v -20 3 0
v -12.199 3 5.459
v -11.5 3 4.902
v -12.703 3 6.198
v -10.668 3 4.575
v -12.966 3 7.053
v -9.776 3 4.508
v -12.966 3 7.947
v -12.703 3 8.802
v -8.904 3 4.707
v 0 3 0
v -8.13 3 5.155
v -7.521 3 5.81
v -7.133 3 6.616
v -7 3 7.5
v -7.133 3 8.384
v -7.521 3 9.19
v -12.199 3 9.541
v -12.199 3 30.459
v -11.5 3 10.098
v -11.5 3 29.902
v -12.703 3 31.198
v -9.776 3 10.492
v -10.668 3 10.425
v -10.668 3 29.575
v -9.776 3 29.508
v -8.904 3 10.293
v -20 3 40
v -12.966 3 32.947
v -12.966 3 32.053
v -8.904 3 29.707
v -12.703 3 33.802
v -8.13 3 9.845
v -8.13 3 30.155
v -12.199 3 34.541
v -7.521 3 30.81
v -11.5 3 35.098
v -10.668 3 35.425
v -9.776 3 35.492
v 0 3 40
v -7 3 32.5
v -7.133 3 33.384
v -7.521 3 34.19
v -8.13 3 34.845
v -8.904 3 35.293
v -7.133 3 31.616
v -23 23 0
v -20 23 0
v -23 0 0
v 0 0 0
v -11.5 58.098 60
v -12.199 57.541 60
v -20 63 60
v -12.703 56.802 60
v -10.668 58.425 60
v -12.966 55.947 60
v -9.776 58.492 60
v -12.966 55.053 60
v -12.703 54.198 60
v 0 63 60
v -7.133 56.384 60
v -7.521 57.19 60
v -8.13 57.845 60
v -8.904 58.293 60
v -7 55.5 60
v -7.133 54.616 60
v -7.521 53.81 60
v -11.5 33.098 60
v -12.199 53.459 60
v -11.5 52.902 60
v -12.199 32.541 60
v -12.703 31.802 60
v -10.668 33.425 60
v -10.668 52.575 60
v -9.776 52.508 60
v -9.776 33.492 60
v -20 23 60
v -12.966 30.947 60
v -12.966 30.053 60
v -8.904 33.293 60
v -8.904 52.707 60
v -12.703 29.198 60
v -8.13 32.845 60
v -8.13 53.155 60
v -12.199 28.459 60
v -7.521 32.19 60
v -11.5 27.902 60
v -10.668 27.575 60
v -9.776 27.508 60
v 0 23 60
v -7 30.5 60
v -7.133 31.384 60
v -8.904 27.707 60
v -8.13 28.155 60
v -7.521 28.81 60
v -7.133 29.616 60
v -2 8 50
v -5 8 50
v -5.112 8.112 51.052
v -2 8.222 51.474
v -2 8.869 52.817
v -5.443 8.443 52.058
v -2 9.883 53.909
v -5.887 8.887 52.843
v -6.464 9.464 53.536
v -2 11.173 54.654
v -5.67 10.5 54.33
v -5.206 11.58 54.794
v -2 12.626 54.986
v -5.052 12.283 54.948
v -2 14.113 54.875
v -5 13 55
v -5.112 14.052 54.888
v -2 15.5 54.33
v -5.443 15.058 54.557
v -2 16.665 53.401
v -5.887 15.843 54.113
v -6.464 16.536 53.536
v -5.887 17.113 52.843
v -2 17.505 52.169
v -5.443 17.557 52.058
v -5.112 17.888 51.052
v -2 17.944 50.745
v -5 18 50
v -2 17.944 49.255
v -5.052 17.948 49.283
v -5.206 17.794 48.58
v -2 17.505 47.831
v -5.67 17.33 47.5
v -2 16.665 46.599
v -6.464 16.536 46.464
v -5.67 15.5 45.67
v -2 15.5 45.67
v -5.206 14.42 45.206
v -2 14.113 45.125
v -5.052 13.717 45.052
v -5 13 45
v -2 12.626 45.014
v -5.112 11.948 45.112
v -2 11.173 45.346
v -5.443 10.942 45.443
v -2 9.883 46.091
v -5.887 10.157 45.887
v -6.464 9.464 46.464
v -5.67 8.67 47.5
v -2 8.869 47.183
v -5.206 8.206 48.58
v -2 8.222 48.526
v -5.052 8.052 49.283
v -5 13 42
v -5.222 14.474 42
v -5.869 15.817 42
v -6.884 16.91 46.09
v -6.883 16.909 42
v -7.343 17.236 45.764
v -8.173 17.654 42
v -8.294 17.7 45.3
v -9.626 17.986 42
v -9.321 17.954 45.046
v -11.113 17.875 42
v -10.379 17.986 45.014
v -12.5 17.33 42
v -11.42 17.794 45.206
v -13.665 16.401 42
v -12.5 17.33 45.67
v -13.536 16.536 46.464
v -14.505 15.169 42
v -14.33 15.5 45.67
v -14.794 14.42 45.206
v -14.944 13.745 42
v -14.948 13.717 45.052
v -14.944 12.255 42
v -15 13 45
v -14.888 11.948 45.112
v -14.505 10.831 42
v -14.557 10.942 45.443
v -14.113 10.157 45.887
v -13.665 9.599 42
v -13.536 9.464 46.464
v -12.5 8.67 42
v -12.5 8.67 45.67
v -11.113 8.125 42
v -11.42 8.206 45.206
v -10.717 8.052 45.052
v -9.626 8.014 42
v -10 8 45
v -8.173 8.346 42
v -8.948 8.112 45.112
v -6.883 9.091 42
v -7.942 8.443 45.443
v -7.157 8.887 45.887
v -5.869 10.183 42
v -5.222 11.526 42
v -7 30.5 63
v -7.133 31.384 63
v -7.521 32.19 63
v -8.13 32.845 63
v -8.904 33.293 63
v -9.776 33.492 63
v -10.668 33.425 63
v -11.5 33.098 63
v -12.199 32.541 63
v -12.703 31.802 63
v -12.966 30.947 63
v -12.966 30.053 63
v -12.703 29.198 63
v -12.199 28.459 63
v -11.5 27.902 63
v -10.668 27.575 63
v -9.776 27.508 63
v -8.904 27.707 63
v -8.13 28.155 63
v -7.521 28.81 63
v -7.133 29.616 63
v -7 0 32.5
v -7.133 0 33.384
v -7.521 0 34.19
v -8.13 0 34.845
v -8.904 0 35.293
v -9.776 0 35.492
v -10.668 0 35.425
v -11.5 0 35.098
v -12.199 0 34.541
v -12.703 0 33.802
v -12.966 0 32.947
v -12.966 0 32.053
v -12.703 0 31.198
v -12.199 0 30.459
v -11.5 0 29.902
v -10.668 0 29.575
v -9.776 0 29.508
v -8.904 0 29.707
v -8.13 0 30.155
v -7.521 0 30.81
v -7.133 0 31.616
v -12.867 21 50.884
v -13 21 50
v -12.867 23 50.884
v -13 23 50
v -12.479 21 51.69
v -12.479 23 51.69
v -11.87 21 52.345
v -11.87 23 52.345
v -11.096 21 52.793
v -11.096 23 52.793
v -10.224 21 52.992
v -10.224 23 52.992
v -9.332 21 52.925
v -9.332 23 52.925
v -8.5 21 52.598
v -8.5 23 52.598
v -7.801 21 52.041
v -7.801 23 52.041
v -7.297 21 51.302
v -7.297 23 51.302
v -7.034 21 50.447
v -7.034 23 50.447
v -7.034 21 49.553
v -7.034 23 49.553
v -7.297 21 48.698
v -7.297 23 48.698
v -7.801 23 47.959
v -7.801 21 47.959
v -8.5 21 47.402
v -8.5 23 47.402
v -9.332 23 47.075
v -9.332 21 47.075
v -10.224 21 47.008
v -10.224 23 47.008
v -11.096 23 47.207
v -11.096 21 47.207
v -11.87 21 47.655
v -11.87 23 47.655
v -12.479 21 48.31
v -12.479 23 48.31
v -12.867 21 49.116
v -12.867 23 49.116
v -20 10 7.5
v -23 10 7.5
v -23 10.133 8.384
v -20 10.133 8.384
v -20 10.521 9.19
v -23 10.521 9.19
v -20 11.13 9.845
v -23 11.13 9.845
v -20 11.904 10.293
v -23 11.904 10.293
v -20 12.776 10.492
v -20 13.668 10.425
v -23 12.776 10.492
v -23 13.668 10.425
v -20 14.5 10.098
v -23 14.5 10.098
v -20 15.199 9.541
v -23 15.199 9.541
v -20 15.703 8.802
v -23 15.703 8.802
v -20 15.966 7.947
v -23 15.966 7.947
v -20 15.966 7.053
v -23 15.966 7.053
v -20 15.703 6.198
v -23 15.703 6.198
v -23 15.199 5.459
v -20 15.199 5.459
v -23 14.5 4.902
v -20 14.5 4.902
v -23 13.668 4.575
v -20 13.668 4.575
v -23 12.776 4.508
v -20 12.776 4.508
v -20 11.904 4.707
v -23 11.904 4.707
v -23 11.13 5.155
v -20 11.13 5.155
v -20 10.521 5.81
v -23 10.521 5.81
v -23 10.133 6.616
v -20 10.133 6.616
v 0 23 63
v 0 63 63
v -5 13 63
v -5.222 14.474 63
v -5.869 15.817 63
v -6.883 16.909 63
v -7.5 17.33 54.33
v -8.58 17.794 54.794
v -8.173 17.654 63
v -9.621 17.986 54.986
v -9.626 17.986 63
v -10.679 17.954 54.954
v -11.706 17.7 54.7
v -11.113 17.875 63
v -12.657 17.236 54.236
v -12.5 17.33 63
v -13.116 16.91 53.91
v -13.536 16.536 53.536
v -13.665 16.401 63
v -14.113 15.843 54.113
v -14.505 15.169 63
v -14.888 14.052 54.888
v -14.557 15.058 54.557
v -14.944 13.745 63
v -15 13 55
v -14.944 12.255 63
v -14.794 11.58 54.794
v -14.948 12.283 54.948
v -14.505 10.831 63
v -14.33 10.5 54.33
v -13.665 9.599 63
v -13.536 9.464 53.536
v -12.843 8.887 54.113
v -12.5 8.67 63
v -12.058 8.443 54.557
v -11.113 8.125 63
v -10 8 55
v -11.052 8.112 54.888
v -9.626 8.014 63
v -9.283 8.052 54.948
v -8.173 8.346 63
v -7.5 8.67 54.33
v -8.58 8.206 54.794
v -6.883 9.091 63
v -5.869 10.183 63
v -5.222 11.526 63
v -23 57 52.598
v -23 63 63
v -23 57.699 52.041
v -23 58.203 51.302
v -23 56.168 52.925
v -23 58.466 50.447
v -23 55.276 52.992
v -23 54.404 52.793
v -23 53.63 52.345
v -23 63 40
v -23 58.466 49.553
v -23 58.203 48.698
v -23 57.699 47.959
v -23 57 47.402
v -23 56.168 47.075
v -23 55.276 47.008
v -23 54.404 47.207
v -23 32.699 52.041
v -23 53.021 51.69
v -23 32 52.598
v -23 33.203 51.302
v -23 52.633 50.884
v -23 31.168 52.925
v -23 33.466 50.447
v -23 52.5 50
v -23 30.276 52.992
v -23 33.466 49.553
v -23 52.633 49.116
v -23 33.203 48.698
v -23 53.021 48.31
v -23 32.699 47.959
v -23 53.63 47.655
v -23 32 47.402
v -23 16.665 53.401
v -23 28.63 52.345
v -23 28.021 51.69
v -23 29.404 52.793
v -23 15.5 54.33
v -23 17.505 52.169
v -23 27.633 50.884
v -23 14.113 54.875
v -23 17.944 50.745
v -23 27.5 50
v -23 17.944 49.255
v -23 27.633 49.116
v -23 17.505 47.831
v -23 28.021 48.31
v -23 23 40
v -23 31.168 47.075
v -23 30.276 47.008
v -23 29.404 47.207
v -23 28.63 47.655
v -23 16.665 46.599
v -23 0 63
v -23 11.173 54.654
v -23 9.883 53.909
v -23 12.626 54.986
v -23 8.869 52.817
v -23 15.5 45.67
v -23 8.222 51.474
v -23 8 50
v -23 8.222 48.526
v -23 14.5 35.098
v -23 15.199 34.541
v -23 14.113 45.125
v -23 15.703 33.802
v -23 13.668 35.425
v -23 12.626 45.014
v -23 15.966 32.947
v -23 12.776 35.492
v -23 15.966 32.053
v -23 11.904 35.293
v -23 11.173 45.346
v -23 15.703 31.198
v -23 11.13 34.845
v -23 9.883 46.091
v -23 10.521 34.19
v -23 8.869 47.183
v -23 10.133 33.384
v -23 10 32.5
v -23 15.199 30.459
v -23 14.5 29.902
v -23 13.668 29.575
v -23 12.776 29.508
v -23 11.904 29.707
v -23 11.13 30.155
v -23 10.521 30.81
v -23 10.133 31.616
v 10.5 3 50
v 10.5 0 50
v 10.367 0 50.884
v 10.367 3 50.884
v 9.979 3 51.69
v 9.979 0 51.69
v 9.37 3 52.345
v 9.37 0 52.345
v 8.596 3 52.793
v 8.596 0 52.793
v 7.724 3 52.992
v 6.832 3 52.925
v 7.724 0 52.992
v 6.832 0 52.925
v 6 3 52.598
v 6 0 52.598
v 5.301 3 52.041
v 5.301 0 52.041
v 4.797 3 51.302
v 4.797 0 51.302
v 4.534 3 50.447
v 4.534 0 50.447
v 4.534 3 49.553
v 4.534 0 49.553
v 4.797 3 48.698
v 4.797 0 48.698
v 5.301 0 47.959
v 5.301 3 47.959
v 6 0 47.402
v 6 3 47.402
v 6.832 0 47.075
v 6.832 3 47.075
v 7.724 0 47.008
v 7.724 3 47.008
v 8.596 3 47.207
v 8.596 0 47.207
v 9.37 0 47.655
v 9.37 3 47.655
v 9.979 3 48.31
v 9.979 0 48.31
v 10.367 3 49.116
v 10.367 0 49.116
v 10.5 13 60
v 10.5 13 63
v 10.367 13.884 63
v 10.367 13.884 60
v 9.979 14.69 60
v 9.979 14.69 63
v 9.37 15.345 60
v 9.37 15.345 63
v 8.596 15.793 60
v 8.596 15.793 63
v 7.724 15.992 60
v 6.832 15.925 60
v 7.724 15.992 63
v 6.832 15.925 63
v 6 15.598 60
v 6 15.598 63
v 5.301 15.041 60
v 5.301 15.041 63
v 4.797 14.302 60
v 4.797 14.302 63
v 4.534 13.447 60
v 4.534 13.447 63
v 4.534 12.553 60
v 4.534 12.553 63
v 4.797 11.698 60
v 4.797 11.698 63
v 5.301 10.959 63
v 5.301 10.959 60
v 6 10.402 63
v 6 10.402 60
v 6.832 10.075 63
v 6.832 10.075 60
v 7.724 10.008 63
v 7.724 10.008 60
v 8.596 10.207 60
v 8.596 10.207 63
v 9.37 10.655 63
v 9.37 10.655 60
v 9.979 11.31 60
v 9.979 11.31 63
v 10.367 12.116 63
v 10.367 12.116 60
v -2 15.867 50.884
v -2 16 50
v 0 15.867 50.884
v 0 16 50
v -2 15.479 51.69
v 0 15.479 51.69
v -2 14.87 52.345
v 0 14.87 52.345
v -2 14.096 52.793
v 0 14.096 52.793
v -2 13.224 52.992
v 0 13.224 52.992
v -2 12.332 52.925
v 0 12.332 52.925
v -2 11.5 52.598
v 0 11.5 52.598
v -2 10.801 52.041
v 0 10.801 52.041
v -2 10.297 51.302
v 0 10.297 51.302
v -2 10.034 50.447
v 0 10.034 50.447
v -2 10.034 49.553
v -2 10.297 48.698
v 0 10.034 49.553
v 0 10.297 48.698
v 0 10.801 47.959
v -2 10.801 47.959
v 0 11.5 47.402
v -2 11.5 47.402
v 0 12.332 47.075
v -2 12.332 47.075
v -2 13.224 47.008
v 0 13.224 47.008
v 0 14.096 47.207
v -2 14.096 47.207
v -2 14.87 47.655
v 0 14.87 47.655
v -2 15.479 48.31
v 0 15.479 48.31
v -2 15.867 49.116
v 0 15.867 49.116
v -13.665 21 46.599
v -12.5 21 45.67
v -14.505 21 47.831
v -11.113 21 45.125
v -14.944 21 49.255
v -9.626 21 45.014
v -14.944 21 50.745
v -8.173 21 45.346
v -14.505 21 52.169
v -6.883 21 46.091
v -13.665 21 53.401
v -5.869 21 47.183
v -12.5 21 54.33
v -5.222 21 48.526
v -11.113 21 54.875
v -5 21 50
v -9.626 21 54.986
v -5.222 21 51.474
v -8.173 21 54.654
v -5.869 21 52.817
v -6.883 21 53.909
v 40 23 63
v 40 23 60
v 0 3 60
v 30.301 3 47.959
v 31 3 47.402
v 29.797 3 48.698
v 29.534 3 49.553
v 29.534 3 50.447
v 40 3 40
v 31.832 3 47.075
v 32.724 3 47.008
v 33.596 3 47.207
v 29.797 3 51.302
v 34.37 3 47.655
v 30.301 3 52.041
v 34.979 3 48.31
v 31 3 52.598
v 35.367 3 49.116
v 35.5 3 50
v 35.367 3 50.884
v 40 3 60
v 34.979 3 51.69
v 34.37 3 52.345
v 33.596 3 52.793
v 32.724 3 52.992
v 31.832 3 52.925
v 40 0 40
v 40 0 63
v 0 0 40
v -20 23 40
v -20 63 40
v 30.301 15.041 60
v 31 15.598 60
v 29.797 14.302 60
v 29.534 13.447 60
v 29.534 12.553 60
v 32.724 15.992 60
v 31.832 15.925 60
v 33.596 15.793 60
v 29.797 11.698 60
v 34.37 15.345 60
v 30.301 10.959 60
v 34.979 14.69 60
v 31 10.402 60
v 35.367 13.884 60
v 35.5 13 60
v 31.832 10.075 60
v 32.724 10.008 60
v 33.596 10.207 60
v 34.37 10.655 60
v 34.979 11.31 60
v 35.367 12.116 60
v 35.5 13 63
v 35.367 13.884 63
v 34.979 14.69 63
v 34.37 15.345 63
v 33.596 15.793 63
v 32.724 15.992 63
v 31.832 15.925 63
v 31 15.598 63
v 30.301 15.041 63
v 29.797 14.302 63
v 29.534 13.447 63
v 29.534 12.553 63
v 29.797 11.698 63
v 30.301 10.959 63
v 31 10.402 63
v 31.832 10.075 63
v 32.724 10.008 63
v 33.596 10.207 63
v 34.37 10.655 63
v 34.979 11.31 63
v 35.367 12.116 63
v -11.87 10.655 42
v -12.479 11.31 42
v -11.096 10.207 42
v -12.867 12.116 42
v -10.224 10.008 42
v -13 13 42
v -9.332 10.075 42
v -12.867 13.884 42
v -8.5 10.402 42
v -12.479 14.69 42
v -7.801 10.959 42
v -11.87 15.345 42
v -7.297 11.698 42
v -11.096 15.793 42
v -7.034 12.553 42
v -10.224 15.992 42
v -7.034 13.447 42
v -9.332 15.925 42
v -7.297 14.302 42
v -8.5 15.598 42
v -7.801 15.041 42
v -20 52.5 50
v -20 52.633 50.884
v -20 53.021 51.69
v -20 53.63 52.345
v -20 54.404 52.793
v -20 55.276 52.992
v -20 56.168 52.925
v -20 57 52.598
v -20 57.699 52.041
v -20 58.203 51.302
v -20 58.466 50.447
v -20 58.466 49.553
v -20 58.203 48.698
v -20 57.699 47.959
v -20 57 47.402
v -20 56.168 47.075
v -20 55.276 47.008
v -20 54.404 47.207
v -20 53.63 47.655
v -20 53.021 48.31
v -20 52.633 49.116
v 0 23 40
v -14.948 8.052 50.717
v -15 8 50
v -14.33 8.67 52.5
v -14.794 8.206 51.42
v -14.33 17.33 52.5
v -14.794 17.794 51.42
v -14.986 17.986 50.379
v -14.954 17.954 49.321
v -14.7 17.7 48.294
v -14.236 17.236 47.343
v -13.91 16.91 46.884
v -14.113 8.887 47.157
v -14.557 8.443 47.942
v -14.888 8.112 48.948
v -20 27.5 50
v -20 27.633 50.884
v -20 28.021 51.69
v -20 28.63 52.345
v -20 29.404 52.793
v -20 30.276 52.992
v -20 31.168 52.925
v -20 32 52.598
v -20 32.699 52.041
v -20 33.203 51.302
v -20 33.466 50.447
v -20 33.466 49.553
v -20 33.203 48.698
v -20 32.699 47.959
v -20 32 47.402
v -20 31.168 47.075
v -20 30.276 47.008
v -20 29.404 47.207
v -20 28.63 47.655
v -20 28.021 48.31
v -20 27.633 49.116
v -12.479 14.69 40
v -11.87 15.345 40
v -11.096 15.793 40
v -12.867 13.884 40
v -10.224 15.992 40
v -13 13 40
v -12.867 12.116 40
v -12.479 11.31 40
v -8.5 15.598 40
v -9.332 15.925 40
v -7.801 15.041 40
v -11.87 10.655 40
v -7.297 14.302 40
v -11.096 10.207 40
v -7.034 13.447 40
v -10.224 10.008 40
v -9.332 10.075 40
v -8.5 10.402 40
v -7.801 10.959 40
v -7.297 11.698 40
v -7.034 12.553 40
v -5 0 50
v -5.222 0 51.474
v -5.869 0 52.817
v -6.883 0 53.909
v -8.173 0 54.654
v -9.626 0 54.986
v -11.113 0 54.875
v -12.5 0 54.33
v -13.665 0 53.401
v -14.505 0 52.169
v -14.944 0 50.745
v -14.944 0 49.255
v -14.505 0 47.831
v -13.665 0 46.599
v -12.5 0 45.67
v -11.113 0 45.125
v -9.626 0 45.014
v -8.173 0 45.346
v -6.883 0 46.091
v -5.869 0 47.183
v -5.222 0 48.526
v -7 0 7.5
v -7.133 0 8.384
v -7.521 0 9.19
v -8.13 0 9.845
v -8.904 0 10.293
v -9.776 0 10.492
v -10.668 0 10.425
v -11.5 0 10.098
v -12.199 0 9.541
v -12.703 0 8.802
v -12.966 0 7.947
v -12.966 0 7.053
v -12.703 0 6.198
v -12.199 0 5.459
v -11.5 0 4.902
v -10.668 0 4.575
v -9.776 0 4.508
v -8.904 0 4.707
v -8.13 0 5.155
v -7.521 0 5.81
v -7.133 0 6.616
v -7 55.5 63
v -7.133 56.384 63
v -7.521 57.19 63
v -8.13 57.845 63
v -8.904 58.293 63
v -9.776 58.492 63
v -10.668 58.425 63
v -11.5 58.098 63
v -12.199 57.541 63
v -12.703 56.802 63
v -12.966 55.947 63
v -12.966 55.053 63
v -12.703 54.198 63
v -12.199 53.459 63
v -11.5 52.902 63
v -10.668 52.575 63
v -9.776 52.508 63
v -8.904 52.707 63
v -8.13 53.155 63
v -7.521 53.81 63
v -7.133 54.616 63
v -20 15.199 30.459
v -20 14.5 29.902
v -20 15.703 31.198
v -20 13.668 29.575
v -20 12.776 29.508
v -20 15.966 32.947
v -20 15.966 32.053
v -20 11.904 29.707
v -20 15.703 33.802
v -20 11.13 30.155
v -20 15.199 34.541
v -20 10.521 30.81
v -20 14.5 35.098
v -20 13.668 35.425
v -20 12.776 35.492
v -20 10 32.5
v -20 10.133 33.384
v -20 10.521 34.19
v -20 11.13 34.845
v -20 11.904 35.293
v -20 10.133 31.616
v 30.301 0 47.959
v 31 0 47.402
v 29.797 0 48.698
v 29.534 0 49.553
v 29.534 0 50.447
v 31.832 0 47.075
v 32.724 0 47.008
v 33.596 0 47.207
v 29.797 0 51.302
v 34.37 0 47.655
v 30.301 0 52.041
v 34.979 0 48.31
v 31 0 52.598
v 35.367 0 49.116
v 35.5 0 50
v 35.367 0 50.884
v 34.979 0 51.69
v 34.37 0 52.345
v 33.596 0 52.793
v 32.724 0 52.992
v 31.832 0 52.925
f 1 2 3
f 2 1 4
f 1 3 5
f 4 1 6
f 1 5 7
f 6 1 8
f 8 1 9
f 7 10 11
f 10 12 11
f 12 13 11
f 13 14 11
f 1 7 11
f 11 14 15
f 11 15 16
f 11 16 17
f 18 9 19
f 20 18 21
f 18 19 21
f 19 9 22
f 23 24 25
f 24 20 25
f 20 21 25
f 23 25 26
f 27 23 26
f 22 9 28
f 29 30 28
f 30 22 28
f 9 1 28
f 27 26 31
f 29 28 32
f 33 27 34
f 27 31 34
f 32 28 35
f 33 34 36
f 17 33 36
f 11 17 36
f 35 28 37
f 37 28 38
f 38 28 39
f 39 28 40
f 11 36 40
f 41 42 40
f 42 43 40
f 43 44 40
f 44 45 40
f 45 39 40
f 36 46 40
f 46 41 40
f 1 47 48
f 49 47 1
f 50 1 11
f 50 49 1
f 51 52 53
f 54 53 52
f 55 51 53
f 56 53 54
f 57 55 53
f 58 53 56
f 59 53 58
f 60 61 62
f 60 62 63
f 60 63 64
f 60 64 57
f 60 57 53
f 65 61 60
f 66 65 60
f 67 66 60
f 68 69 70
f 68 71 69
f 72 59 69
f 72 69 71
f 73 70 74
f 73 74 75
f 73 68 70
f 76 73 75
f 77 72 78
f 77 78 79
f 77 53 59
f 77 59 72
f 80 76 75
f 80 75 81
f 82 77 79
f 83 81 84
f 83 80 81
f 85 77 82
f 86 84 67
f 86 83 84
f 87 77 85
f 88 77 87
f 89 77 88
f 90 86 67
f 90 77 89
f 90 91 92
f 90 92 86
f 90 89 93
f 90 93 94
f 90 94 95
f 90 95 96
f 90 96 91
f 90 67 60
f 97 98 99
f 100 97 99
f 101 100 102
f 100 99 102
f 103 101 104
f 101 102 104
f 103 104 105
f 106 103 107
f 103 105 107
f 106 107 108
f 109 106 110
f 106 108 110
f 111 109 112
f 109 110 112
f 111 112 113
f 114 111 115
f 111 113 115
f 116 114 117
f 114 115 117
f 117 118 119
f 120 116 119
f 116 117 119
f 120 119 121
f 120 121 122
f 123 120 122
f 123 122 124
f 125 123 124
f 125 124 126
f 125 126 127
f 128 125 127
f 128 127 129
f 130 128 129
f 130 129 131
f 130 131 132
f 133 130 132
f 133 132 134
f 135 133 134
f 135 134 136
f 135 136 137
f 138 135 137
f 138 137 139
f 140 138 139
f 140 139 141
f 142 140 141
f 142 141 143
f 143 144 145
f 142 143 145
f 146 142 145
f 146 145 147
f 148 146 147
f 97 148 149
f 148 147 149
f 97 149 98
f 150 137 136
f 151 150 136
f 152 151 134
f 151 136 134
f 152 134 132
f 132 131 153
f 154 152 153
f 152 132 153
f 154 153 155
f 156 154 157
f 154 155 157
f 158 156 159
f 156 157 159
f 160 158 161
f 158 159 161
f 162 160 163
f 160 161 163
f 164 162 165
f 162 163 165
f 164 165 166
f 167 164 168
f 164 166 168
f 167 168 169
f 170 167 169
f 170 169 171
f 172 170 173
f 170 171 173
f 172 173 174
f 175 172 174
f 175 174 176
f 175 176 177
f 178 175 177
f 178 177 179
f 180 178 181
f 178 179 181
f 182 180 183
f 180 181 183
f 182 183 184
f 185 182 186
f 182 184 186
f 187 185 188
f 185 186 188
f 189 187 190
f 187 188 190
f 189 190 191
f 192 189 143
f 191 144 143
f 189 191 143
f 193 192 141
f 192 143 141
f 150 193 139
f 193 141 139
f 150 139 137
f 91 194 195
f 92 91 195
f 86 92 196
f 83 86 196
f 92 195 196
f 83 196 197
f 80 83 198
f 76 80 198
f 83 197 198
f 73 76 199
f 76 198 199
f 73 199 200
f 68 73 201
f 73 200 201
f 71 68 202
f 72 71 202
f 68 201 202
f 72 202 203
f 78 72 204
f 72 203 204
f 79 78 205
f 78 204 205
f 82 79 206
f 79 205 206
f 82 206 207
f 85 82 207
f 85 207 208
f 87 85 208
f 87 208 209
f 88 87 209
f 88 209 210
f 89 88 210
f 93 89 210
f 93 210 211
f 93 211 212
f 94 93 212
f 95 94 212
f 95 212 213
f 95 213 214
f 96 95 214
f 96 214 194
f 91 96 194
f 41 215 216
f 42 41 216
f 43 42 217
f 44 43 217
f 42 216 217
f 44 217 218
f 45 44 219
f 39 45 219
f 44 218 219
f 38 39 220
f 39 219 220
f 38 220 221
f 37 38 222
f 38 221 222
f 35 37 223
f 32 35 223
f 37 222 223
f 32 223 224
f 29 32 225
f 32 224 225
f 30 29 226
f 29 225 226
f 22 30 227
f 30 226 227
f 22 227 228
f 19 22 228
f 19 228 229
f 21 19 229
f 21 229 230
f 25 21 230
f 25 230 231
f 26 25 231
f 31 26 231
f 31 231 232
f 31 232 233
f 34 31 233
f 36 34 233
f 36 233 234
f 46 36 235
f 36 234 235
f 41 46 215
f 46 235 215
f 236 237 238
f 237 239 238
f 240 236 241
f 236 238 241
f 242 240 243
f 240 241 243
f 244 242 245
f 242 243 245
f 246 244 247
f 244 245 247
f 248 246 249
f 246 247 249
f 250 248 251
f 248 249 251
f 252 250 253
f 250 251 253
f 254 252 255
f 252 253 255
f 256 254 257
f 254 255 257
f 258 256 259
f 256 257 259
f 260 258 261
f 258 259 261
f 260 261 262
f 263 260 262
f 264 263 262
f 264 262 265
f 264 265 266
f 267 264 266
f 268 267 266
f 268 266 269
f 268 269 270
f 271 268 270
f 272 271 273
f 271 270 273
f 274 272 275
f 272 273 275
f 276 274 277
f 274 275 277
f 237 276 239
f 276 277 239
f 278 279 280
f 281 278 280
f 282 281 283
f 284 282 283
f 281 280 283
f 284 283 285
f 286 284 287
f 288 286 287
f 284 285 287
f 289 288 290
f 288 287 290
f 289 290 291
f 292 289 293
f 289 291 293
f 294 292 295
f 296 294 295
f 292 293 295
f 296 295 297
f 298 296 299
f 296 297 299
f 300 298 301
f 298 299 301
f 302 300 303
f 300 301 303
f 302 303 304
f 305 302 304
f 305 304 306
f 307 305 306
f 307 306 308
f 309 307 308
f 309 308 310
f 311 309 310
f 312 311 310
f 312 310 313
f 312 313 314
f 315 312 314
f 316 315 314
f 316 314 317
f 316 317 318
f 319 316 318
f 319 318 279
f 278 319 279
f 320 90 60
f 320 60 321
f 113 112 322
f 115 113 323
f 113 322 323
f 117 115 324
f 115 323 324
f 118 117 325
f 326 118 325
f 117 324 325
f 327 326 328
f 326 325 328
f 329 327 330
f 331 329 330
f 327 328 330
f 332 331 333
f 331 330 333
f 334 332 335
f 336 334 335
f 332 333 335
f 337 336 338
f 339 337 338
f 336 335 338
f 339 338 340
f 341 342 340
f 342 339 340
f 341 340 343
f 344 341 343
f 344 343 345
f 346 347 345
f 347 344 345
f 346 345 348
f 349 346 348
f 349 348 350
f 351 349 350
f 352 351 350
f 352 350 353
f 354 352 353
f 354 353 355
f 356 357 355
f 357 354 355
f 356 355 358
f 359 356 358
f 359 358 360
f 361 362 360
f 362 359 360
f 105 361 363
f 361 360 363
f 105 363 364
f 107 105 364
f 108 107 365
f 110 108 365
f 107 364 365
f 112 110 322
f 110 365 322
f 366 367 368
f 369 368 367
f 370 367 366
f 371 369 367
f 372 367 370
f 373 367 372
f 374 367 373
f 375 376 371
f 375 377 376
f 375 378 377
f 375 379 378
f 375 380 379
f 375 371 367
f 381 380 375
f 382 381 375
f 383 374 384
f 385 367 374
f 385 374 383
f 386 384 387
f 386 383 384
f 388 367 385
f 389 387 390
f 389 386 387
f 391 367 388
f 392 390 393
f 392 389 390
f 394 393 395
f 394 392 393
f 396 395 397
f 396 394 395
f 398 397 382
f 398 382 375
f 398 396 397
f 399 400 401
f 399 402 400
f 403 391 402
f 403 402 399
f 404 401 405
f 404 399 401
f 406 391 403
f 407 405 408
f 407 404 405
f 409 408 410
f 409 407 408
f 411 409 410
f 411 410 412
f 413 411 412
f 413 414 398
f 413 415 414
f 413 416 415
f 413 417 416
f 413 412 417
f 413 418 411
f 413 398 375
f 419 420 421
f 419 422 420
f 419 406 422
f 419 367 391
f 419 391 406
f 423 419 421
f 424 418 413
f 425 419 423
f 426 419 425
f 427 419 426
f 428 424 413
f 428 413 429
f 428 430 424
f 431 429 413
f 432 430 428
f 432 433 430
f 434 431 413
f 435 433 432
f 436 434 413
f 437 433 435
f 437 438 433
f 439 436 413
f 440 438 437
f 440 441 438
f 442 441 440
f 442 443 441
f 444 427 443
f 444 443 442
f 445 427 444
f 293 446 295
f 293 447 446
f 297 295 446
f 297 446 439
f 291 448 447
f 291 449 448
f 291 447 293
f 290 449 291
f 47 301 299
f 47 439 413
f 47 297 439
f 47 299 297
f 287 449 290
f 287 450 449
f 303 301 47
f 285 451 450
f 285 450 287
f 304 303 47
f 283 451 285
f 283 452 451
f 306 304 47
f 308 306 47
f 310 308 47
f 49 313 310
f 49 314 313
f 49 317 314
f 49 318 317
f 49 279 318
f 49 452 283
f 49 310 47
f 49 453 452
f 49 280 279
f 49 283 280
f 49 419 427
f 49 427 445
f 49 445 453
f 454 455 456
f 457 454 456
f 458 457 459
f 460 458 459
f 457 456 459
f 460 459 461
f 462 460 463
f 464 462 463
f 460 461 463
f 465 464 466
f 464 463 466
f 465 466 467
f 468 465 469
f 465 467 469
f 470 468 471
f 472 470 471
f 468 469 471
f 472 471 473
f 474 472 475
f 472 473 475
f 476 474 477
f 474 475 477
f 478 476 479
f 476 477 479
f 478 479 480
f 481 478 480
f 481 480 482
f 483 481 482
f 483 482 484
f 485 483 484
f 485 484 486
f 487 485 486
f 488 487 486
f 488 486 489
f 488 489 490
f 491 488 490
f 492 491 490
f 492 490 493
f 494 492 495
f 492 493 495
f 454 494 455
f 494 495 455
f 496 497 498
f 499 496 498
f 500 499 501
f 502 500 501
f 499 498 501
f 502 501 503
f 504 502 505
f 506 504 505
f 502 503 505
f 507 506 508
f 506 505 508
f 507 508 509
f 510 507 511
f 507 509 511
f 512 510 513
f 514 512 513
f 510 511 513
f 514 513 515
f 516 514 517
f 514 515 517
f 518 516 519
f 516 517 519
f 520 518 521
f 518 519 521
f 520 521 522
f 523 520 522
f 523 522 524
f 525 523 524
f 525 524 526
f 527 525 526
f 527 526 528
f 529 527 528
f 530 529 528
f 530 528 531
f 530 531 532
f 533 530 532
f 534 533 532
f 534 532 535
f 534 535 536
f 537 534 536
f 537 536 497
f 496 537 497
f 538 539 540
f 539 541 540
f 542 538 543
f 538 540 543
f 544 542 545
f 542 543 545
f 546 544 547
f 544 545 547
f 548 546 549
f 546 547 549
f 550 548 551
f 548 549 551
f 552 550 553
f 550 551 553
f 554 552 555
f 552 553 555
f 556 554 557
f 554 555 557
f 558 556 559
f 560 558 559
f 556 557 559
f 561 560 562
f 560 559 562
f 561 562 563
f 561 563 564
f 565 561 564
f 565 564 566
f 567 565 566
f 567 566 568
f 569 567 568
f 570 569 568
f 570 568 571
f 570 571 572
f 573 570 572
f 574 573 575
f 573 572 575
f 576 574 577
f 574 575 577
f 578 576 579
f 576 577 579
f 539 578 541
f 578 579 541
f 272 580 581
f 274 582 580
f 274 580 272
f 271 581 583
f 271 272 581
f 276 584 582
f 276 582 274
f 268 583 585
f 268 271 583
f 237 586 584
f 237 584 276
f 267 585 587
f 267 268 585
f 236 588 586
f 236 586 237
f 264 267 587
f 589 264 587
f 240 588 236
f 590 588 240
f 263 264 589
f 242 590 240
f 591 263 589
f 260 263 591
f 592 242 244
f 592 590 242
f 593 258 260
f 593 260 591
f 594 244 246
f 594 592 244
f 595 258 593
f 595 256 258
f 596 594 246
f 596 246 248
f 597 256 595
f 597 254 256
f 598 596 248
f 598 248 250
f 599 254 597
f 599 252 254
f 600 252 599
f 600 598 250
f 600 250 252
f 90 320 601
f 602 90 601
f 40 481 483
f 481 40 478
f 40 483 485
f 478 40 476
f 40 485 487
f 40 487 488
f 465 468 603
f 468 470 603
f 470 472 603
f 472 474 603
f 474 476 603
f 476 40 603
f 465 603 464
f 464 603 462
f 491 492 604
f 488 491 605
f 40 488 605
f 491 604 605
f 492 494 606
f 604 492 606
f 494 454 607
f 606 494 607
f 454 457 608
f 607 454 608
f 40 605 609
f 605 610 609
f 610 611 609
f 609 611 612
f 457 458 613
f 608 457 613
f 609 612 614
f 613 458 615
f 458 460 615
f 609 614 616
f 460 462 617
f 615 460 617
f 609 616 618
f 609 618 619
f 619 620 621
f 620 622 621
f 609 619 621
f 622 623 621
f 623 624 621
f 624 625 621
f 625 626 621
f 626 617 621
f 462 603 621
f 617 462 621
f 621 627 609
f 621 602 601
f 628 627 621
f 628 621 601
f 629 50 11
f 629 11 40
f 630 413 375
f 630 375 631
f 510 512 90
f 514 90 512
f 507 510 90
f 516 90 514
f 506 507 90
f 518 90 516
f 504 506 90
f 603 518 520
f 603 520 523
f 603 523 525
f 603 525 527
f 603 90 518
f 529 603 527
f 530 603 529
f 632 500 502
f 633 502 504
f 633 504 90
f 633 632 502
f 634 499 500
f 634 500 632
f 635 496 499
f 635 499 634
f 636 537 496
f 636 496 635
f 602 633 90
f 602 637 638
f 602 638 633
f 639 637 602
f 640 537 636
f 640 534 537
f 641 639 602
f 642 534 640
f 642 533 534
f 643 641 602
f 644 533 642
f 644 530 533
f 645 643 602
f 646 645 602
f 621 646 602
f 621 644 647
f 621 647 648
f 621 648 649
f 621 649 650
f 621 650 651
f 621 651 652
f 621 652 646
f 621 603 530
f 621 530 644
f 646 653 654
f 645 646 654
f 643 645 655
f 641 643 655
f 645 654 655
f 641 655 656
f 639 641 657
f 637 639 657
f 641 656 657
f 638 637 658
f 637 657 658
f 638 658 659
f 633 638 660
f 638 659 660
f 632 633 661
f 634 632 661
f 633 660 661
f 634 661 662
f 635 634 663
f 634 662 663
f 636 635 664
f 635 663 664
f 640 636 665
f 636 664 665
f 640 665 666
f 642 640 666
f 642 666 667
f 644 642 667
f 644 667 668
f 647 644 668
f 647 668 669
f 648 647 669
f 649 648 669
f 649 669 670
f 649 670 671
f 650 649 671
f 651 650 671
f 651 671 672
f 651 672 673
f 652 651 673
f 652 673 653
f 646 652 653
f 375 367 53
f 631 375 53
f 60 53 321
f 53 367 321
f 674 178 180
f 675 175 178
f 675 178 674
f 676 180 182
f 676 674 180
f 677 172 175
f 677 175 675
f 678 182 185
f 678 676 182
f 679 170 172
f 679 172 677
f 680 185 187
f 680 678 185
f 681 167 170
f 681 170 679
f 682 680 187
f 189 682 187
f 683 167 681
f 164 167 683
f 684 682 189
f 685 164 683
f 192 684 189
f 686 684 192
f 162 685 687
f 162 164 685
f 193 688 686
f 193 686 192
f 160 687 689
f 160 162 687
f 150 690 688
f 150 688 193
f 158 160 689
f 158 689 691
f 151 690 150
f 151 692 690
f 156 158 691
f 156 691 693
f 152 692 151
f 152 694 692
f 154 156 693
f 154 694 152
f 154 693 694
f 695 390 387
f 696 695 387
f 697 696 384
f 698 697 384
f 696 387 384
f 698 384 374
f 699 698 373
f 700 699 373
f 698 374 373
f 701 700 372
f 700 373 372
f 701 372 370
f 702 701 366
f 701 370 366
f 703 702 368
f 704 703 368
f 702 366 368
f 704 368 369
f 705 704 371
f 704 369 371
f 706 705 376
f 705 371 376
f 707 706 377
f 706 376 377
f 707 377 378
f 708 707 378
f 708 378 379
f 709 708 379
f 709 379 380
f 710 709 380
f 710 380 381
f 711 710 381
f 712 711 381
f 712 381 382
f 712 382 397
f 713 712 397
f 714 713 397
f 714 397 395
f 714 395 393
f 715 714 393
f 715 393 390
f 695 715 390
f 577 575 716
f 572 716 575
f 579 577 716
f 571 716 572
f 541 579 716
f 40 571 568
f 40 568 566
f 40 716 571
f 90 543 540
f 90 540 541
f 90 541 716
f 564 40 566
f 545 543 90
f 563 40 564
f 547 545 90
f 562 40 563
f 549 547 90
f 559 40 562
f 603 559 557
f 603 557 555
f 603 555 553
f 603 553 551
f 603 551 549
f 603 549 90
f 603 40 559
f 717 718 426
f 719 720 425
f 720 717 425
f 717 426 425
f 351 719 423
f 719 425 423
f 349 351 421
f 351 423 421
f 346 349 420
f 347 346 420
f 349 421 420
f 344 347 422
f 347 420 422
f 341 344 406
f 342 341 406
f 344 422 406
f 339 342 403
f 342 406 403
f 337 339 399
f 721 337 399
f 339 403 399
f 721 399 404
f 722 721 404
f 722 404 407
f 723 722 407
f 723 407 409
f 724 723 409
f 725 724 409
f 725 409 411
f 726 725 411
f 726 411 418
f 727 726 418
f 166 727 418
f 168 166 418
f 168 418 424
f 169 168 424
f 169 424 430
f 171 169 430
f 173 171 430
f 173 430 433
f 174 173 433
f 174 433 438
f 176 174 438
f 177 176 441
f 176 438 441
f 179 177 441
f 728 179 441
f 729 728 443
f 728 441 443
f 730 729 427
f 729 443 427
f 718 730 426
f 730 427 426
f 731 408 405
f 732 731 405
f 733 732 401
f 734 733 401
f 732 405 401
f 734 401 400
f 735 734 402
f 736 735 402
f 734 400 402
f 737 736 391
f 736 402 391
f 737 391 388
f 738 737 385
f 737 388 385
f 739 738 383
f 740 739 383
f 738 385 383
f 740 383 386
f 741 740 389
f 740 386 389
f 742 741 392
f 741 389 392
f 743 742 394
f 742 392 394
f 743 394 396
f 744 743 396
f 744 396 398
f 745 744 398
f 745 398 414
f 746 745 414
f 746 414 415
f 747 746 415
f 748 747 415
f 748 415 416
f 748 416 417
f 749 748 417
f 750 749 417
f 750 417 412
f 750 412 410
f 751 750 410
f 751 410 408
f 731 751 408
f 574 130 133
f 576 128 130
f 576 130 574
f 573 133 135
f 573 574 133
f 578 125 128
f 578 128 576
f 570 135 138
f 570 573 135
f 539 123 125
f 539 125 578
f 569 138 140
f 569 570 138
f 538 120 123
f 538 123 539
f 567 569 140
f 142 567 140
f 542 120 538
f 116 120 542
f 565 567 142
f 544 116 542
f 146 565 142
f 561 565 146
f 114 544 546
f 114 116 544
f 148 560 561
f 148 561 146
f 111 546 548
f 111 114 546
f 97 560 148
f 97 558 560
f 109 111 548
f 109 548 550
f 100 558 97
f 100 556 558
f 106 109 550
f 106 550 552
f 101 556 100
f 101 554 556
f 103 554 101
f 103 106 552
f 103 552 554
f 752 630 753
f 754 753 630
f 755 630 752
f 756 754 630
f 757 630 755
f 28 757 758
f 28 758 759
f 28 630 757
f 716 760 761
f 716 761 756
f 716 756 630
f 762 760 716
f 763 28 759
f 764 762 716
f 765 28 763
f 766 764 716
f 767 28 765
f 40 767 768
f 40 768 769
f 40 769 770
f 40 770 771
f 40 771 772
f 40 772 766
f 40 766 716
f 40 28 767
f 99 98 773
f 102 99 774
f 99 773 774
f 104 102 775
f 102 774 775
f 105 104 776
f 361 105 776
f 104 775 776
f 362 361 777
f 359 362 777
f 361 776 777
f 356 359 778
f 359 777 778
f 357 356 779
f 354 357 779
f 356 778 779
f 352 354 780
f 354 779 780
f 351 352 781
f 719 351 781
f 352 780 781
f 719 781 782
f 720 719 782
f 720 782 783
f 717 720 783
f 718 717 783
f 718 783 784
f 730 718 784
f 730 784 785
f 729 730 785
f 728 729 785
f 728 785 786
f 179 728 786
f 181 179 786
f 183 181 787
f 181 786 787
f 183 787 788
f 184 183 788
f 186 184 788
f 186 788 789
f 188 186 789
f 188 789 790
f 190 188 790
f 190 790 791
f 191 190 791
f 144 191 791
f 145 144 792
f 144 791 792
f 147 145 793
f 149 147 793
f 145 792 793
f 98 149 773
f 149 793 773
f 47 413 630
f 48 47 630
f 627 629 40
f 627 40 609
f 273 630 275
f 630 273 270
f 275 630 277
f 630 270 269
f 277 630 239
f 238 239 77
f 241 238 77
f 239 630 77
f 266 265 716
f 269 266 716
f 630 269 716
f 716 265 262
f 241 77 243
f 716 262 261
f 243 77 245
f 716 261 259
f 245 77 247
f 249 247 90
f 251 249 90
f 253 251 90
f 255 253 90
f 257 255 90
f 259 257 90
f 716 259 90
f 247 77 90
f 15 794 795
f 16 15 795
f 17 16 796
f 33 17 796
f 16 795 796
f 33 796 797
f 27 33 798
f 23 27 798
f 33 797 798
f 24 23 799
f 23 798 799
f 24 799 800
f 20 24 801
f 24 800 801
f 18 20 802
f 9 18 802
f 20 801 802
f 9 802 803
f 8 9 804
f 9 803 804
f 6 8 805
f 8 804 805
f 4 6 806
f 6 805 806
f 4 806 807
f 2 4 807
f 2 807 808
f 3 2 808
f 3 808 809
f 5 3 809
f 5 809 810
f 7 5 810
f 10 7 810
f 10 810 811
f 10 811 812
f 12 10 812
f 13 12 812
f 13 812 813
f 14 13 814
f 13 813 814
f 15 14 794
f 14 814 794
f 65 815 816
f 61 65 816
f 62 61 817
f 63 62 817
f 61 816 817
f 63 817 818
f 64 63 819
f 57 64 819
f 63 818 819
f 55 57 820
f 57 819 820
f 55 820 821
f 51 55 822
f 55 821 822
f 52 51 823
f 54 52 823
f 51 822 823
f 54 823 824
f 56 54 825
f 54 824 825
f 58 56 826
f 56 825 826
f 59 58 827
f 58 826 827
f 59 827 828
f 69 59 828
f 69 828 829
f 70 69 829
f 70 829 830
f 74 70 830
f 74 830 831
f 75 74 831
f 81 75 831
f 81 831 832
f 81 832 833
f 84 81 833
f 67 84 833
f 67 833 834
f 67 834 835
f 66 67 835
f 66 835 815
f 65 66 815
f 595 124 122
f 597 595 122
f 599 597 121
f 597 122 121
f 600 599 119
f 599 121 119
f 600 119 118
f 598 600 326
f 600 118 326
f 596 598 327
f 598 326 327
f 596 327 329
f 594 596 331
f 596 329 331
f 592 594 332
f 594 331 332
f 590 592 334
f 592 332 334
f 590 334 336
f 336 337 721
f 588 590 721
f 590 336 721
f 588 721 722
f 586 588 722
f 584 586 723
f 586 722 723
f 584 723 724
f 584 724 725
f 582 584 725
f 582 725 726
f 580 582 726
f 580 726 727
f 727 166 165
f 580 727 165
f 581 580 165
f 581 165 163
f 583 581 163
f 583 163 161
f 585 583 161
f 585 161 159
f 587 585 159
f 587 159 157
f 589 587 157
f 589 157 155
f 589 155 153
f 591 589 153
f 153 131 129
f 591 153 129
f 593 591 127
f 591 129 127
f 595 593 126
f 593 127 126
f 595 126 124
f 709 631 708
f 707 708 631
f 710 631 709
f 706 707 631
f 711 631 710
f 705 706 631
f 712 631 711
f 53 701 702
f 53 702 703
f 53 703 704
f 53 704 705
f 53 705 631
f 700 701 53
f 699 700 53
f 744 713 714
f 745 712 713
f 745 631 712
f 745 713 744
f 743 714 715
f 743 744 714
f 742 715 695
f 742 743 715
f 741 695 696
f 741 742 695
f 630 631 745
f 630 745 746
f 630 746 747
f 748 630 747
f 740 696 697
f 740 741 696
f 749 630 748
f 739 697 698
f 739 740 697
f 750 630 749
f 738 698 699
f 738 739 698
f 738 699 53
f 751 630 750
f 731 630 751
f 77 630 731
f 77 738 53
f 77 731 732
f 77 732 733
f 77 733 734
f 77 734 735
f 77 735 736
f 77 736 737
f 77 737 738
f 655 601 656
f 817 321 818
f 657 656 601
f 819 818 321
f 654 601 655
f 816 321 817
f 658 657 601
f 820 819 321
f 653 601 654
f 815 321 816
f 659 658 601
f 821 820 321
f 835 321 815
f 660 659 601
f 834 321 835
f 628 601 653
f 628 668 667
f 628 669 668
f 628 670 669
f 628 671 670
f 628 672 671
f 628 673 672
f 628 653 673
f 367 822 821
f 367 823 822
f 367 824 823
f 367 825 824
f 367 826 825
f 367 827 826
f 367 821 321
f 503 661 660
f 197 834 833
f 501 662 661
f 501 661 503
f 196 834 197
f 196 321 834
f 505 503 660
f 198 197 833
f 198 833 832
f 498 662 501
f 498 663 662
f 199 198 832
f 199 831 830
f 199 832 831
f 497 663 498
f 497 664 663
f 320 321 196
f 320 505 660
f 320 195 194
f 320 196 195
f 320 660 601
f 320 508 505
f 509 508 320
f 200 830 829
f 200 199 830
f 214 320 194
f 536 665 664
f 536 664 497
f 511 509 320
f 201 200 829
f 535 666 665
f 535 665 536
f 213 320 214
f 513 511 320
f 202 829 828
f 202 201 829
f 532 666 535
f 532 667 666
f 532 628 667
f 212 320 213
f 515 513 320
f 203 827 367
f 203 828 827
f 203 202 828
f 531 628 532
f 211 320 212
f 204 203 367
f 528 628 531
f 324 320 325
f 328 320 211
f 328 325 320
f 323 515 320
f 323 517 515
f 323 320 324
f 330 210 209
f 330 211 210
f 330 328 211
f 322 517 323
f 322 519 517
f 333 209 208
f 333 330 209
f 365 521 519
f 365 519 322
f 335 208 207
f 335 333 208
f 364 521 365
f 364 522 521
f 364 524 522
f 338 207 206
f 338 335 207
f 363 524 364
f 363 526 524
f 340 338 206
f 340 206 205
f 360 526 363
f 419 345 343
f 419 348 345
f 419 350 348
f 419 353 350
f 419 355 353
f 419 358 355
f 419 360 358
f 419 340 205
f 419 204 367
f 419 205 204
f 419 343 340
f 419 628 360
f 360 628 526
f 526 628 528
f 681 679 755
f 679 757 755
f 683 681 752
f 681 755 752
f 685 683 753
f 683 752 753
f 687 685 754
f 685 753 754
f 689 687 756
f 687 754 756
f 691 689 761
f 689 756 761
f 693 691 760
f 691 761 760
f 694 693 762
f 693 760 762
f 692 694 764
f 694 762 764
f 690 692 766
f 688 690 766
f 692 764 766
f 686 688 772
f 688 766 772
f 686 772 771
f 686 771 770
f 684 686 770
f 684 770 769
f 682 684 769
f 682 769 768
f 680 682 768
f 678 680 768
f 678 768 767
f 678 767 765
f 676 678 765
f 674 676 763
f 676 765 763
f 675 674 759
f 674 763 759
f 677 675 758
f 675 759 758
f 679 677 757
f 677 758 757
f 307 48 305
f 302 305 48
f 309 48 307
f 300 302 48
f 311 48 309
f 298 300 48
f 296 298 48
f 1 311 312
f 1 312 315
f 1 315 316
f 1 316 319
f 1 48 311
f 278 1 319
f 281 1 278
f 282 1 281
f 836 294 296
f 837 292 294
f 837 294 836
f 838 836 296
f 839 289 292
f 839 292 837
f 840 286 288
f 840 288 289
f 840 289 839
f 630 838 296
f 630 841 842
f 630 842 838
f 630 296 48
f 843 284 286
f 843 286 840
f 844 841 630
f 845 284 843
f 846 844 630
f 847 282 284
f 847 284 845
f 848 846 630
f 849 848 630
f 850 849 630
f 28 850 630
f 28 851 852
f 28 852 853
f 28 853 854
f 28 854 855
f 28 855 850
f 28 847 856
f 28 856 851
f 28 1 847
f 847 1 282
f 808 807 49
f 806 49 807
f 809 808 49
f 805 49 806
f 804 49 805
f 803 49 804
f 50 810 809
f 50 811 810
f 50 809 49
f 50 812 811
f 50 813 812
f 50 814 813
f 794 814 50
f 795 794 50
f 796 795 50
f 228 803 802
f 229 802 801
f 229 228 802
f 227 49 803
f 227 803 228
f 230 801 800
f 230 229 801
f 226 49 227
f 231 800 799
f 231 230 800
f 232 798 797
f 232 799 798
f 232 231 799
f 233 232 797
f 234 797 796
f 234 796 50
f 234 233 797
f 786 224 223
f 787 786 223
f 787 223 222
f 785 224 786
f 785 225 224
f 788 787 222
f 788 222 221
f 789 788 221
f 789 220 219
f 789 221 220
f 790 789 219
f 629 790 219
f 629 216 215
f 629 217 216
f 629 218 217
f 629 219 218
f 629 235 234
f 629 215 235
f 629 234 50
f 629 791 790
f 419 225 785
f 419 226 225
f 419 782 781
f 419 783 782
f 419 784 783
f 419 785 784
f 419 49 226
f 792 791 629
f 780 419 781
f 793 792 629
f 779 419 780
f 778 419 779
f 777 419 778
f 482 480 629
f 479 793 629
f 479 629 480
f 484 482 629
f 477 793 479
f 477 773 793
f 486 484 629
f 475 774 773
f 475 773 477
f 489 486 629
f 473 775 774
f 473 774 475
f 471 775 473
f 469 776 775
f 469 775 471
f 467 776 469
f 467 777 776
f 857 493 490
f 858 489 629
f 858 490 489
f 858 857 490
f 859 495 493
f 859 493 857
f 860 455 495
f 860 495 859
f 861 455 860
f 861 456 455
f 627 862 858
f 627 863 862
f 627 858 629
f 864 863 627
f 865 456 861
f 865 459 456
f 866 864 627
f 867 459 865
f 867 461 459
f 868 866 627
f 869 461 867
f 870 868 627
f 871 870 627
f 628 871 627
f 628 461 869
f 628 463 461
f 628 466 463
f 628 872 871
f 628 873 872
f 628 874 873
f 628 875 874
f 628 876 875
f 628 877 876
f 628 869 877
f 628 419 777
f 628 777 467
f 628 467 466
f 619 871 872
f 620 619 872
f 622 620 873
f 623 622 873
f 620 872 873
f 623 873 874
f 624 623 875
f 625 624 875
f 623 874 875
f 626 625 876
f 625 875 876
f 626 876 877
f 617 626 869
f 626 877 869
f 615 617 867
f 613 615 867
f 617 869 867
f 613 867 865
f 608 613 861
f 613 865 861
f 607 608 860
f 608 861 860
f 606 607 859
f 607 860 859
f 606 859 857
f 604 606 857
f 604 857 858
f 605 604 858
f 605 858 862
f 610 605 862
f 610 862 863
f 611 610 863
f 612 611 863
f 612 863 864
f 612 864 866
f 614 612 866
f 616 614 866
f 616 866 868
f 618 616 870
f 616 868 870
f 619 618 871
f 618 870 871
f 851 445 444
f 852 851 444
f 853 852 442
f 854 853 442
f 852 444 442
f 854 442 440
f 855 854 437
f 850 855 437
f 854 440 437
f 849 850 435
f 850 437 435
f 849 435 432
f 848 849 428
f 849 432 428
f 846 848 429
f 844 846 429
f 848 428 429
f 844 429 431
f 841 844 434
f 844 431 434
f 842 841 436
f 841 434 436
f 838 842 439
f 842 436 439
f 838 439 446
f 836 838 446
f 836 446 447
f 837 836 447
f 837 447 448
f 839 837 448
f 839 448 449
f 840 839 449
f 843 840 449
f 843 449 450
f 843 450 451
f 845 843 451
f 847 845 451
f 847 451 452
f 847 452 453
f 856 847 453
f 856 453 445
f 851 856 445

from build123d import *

# Parameters (mm, degrees)
F0_W                 = 20
F0_H                 = 40
F0_R                 = 3
F0_H_2               = 20
F0_R_2               = 5
F0_W_2               = 40
F1_DEPTH             = 3
F0_W_3               = 3
F0_H_3               = 3
F2_DEPTH             = 23
F3_DEPTH             = 63
F4_R                 = 3
F4_R_2               = 5
F6_DEPTH             = 25
F5_R                 = 3
F5_R_2               = 5
F7_DEPTH             = 25
F8_DEPTH             = 23
F9_D                 = 6
F9_DEPTH             = 23
F9_CBORE_D           = 10
F9_CBORE_DEPTH       = 21
F9_TIP               = 1.8025818571
F9_ON_F5_D           = 6
F9_ON_F5_DEPTH       = 23
F9_ON_F5_CBORE_D     = 10
F9_ON_F5_CBORE_DEPTH = 21
F9_ON_F5_TIP         = 1.8025818571
F9_ON_F4_D           = 6
F9_ON_F4_DEPTH       = 23
F9_ON_F4_CBORE_D     = 10
F9_ON_F4_CBORE_DEPTH = 21
F9_ON_F4_TIP         = 1.8025818571


# Not quite as in the source:
# - a feature of the source that left no trace in its solid (it failed there, or was rolled back) is left out


with BuildPart() as f1:
    # F0 (on Front) → F1 (new body)
    with BuildSketch(Plane.XZ):
        with Locations((-10, 20)):
            Rectangle(F0_W, F0_H)
        with Locations((-10, 7.5)):
            Circle(F0_R, mode=Mode.SUBTRACT)
        with Locations((-10, 32.5)):
            Circle(F0_R, mode=Mode.SUBTRACT)
        with Locations((-10, 50)):
            Rectangle(F0_W, F0_H_2)
        with Locations((-10, 50)):
            Circle(F0_R_2, mode=Mode.SUBTRACT)
        with Locations((20, 50)):
            Rectangle(F0_W_2, F0_H_2)
        with Locations((7.5, 50)):
            Circle(F0_R, mode=Mode.SUBTRACT)
        with Locations((32.5, 50)):
            Circle(F0_R, mode=Mode.SUBTRACT)
    extrude(amount=-F1_DEPTH)

    # F0 (on Front) → F2 (join)
    with BuildSketch(Plane.XZ):
        with Locations((-21.5, 20)):
            Rectangle(F0_W_3, F0_H)
        with Locations((20, 61.5)):
            Rectangle(F0_W_2, F0_H_3)
    extrude(amount=-F2_DEPTH)

    # F0 (on Front) → F3 (join)
    with BuildSketch(Plane.XZ):
        Polygon((-20, 60), (0, 60), (0, 63), (-23, 63), (-23, 60), align=None)
        with Locations((-21.5, 50)):
            Rectangle(F0_W_3, F0_H_2)
    extrude(amount=-F3_DEPTH)

    # F4 (on face) → F6 (cut)
    with BuildSketch(Plane.XY.offset(63)):
        with Locations((-10, 55.5)):
            Circle(F4_R)
        with Locations((-10, 30.5)):
            Circle(F4_R)
        with Locations((-10, 13)):
            Circle(F4_R_2)
        with Locations((7.5, 13)):
            Circle(F4_R)
        with Locations((32.5, 13)):
            Circle(F4_R)
    extrude(amount=-F6_DEPTH, mode=Mode.SUBTRACT)

    # F5 (on face) → F7 (cut)
    with BuildSketch(Plane(origin=(-23, 0, 0), x_dir=(0, -1, 0), z_dir=(-1, 0, 0))):
        with Locations((-55.5, 50)):
            Circle(F5_R)
        with Locations((-30.5, 50)):
            Circle(F5_R)
        with Locations((-13, 50)):
            Circle(F5_R_2)
        with Locations((-13, 7.5)):
            Circle(F5_R)
        with Locations((-13, 32.5)):
            Circle(F5_R)
    extrude(amount=-F7_DEPTH, mode=Mode.SUBTRACT)

    # F0 (on Front) → F8 (join)
    with BuildSketch(Plane.XZ):
        with Locations((-10, 50)):
            Rectangle(F0_W, F0_H_2)
        with Locations((-10, 50)):
            Circle(F0_R_2, mode=Mode.SUBTRACT)
        Polygon((-20, 60), (0, 60), (0, 63), (-23, 63), (-23, 60), align=None)
        with Locations((-21.5, 50)):
            Rectangle(F0_W_3, F0_H_2)
        with Locations((-10, 50)):
            Circle(F0_R_2)
    extrude(amount=-F8_DEPTH)

    # F9
    with Locations(Plane.XZ):
        with Locations((-10, 50)):
            CounterBoreHole(F9_D / 2, F9_CBORE_D / 2, F9_CBORE_DEPTH, depth=F9_DEPTH)
            with Locations((0, 0, -(F9_DEPTH + F9_TIP / 2))):  # 118° drill point
                Cone(0, F9_D / 2, F9_TIP, mode=Mode.SUBTRACT)

    # F9 on F5
    with Locations(Plane(origin=(-23, 0, 0), x_dir=(0, -1, 0), z_dir=(-1, 0, 0))):
        with Locations((-13, 50)):
            CounterBoreHole(F9_ON_F5_D / 2, F9_ON_F5_CBORE_D / 2, F9_ON_F5_CBORE_DEPTH, depth=F9_ON_F5_DEPTH)
            with Locations((0, 0, -(F9_ON_F5_DEPTH + F9_ON_F5_TIP / 2))):  # 118° drill point
                Cone(0, F9_ON_F5_D / 2, F9_ON_F5_TIP, mode=Mode.SUBTRACT)

    # F9 on F4
    with Locations(Plane.XY.offset(63)):
        with Locations((-10, 13)):
            CounterBoreHole(F9_ON_F4_D / 2, F9_ON_F4_CBORE_D / 2, F9_ON_F4_CBORE_DEPTH, depth=F9_ON_F4_DEPTH)
            with Locations((0, 0, -(F9_ON_F4_DEPTH + F9_ON_F4_TIP / 2))):  # 118° drill point
                Cone(0, F9_ON_F4_D / 2, F9_ON_F4_TIP, mode=Mode.SUBTRACT)


solid = f1.part
